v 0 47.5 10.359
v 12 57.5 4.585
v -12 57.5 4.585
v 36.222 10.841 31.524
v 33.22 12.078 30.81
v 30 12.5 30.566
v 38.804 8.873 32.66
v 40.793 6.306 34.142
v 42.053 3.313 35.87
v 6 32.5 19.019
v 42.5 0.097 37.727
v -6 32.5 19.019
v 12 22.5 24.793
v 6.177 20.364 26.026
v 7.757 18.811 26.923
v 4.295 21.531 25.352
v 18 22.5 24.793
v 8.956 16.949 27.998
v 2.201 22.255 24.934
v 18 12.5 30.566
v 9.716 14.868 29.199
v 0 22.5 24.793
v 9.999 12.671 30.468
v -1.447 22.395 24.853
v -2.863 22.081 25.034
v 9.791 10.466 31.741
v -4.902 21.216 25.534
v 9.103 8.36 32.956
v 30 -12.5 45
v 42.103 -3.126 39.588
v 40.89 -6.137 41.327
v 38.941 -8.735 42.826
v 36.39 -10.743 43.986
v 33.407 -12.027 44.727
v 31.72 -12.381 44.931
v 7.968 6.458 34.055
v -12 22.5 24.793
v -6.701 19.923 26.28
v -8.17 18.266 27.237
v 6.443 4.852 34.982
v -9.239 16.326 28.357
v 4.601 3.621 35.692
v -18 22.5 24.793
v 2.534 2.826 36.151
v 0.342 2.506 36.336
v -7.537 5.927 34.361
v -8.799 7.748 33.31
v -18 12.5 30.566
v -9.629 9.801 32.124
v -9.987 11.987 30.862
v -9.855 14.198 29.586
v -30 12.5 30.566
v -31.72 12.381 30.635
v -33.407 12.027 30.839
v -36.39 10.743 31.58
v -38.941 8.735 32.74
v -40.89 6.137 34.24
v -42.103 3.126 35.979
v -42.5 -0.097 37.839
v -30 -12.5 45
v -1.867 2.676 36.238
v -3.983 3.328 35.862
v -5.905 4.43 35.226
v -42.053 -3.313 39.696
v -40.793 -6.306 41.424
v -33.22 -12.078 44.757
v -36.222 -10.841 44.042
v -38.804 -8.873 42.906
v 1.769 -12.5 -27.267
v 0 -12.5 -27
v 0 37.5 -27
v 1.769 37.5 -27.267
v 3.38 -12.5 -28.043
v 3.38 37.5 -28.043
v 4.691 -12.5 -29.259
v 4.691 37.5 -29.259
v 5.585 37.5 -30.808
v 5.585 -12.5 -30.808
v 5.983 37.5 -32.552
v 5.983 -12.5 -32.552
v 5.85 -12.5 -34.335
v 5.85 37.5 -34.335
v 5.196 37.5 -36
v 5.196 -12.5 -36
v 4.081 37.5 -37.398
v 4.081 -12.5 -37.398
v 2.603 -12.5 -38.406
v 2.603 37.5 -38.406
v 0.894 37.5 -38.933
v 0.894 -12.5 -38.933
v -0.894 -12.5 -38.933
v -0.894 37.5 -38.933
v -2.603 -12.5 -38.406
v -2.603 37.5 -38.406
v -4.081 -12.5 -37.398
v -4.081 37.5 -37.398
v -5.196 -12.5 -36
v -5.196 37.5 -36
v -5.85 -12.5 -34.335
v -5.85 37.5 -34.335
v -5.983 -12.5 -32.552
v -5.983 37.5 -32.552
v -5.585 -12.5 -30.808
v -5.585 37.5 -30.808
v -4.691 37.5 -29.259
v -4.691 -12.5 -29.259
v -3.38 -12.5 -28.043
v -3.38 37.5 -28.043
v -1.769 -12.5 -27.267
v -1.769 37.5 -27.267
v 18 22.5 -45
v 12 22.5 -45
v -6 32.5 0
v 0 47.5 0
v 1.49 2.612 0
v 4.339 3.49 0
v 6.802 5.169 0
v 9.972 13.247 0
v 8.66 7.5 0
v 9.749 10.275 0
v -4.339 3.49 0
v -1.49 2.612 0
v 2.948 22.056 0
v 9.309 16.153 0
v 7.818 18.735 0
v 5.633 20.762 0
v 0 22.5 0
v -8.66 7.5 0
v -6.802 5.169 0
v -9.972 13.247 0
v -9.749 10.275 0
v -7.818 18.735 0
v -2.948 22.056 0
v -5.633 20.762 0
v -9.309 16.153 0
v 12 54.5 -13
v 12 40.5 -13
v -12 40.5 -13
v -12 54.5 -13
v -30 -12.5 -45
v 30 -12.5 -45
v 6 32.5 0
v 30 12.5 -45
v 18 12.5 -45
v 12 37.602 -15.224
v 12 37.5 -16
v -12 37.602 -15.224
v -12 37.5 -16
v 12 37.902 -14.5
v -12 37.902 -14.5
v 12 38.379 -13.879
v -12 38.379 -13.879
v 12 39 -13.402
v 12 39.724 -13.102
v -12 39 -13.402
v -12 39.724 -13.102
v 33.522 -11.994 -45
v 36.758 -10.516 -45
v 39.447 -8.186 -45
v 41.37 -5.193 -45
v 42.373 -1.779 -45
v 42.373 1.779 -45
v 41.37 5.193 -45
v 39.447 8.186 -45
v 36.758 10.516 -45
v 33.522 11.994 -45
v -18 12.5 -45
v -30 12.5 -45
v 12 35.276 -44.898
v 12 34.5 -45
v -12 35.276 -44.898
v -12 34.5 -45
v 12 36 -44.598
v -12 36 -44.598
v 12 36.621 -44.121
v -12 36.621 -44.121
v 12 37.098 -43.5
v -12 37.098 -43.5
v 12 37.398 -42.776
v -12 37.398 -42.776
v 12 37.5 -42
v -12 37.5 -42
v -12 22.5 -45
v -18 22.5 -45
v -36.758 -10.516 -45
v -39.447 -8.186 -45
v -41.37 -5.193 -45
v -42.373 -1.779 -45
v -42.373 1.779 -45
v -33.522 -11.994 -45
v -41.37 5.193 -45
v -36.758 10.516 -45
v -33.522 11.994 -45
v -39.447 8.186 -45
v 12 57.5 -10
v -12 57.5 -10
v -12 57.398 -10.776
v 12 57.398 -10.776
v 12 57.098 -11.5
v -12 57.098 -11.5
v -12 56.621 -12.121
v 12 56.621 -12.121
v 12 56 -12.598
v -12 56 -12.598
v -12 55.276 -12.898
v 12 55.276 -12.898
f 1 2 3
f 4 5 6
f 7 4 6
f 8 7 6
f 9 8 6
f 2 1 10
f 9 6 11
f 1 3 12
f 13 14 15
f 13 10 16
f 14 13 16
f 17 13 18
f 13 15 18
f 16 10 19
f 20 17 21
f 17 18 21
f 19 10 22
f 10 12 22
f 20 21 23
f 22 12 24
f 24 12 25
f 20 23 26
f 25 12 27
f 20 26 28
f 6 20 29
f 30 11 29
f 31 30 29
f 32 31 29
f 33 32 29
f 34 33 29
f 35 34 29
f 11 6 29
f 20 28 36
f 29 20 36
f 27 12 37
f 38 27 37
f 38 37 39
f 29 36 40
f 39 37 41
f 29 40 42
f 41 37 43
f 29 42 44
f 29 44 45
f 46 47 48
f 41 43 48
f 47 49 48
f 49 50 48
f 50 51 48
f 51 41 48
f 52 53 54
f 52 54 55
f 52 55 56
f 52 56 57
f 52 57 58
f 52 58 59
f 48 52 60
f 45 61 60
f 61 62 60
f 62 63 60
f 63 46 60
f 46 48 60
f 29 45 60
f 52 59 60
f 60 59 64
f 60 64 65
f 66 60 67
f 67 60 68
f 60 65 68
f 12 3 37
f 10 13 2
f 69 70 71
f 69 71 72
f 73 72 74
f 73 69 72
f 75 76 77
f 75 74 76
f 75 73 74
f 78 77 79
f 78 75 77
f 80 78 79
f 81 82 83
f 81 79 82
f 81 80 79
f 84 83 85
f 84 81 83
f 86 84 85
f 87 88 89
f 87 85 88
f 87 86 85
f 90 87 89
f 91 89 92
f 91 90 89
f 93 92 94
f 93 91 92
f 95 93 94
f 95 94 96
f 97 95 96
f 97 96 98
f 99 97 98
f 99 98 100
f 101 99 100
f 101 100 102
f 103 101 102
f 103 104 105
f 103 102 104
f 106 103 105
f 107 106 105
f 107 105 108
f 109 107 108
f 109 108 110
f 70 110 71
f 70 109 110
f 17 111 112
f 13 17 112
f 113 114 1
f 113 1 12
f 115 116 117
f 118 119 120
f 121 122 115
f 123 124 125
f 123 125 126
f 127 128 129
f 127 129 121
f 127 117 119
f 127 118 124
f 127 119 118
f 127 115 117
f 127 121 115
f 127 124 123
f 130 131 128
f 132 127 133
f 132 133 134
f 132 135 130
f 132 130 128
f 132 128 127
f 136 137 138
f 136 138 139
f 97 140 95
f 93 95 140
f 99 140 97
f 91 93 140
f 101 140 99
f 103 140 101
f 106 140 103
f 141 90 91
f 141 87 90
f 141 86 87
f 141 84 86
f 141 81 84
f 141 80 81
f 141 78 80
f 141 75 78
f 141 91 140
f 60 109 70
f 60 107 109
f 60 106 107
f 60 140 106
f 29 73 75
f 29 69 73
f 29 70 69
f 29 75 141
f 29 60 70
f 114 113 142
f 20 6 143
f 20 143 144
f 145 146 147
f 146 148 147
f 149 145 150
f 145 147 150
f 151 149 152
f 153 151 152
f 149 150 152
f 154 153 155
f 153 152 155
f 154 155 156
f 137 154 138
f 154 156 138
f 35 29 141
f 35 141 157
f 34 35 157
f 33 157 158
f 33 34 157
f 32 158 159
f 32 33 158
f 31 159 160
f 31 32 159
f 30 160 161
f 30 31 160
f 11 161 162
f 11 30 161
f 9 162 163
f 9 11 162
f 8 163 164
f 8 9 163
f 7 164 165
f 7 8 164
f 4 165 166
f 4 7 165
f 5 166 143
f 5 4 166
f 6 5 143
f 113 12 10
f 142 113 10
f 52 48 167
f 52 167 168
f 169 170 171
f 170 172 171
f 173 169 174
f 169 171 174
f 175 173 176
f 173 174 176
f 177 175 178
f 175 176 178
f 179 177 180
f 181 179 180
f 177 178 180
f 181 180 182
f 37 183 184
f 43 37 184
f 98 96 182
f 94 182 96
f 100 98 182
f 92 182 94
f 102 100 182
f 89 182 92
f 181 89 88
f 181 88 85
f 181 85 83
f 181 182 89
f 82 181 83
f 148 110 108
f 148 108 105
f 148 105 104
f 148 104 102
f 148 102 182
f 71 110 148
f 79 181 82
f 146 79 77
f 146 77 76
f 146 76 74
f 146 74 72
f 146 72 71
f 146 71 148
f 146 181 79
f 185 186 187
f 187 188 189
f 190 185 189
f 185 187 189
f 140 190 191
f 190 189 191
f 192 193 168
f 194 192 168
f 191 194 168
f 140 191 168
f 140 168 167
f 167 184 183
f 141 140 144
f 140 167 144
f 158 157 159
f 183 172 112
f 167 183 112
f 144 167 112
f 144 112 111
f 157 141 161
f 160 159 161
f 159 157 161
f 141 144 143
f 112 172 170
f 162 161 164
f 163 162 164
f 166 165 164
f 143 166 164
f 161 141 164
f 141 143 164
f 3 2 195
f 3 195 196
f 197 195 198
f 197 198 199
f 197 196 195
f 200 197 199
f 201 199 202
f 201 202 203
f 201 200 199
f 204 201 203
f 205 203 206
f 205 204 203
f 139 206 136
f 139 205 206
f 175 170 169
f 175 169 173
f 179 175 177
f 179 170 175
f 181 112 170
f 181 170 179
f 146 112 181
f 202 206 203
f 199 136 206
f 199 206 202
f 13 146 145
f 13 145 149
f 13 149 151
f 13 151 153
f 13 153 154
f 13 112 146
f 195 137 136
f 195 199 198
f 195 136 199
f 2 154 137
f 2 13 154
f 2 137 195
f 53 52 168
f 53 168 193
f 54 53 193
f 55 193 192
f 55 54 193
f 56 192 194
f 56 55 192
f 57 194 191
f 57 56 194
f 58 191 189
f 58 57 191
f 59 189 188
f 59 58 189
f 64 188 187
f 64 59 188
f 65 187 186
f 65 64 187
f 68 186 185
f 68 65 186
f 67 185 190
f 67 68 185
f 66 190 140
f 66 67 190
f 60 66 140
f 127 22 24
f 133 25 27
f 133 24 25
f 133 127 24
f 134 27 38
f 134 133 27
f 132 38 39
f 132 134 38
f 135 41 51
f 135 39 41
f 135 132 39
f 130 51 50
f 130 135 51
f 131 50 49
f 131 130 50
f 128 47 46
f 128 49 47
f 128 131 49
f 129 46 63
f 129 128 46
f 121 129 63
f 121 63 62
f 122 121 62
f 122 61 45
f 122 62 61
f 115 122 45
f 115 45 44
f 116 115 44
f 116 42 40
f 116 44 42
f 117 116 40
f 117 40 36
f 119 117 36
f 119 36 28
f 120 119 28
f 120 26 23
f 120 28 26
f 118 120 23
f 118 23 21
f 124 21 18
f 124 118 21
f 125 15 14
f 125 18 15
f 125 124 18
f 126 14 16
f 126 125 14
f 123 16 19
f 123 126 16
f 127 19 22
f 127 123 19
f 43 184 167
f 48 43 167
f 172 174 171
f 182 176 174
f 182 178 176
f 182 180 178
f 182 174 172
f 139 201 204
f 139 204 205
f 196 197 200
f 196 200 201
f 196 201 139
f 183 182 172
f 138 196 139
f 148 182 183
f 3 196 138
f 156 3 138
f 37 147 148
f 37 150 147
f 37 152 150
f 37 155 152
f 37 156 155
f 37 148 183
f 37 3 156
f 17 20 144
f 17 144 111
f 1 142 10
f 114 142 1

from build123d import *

# Parameters (mm, degrees)
BOSS_EXTRUDE1_DEPTH     = 45
CUT_EXTRUDE1_DEPTH      = 85.483726244
CUT_EXTRUDE1_DEPTH_BACK = 85.483726244
SKETCH3_R               = 10
CUT_EXTRUDE2_DEPTH      = 85.483726244
CUT_EXTRUDE3_DEPTH      = 92.112567739
CUT_EXTRUDE3_DEPTH_BACK = 92.112567739
SKETCH5_W               = 32
SKETCH5_H               = 20
CUT_EXTRUDE4_DEPTH      = 94.441157955
CUT_EXTRUDE4_DEPTH_BACK = 94.441157955
SKETCH4_R               = 6
FILLET1_R               = 3


with BuildPart() as part:
    # Sketch1 → Boss-Extrude1 (new, symmetric)
    with BuildSketch(Plane.XY):
        with BuildLine():
            Line((-30, -12.5), (30, -12.5))
            ThreePointArc((30, -12.5), (42.5, 0), (30, 12.5))
            Line((30, 12.5), (18, 12.5))
            Line((18, 12.5), (18, 22.5))
            Line((18, 22.5), (12, 22.5))
            Line((12, 22.5), (12, 57.5))
            Line((12, 57.5), (-12, 57.5))
            Line((-12, 57.5), (-12, 22.5))
            Line((-12, 22.5), (-18, 22.5))
            Line((-18, 22.5), (-18, 12.5))
            Line((-18, 12.5), (-30, 12.5))
            ThreePointArc((-30, 12.5), (-42.5, 0), (-30, -12.5))
        make_face()
    extrude(amount=BOSS_EXTRUDE1_DEPTH, both=True)

    # Sketch2 → Cut-Extrude1 (cut, two sides: drawn at the far end of the back side and taken through both)
    with BuildSketch(Plane(origin=(0, 0, 0), x_dir=(0, 0, -1), z_dir=(1, 0, 0)).offset(-CUT_EXTRUDE1_DEPTH_BACK)):
        Polygon((-4.585481157, 57.5), (-45, -12.5), (-45, 57.5), align=None)
    extrude(amount=CUT_EXTRUDE1_DEPTH + CUT_EXTRUDE1_DEPTH_BACK, mode=Mode.SUBTRACT)

    # Sketch3 → Cut-Extrude2 (cut, through all)
    with BuildSketch(Plane.XY):
        with Locations(Location((0, 12.5, 0), (0, 0, 90))):
            Circle(SKETCH3_R)
        Polygon((0, 47.5), (-6, 32.5), (6, 32.5), align=None)
    extrude(amount=CUT_EXTRUDE2_DEPTH, mode=Mode.SUBTRACT)

    # Sketch5 → Cut-Extrude3 (cut, two sides: drawn at the far end of the back side and taken through both)
    with BuildSketch(Plane.ZY.offset(12).offset(-CUT_EXTRUDE3_DEPTH_BACK)):
        with Locations((-29, 47.5)):
            Rectangle(SKETCH5_W, SKETCH5_H)
    extrude(amount=CUT_EXTRUDE3_DEPTH + CUT_EXTRUDE3_DEPTH_BACK, mode=Mode.SUBTRACT)

    # Sketch4 → Cut-Extrude4 (cut, two sides: drawn at the far end of the back side and taken through both)
    with BuildSketch(Plane(origin=(0, 57.5, 0), x_dir=(1, 0, 0), z_dir=(0, 1, 0)).offset(-CUT_EXTRUDE4_DEPTH_BACK)):
        with Locations(Location((0, 33, 0), (0, 0, 270))):
            Circle(SKETCH4_R)
    extrude(amount=CUT_EXTRUDE4_DEPTH + CUT_EXTRUDE4_DEPTH_BACK, mode=Mode.SUBTRACT)

    # Fillet1
    fillet1_edges = [part.edges().sort_by_distance(p)[0] for p in [
        (0, 37.5, -45),
        (0, 57.5, -13),
        (0, 37.5, -13),
    ]]
    fillet(fillet1_edges, radius=FILLET1_R)


solid = part.part
